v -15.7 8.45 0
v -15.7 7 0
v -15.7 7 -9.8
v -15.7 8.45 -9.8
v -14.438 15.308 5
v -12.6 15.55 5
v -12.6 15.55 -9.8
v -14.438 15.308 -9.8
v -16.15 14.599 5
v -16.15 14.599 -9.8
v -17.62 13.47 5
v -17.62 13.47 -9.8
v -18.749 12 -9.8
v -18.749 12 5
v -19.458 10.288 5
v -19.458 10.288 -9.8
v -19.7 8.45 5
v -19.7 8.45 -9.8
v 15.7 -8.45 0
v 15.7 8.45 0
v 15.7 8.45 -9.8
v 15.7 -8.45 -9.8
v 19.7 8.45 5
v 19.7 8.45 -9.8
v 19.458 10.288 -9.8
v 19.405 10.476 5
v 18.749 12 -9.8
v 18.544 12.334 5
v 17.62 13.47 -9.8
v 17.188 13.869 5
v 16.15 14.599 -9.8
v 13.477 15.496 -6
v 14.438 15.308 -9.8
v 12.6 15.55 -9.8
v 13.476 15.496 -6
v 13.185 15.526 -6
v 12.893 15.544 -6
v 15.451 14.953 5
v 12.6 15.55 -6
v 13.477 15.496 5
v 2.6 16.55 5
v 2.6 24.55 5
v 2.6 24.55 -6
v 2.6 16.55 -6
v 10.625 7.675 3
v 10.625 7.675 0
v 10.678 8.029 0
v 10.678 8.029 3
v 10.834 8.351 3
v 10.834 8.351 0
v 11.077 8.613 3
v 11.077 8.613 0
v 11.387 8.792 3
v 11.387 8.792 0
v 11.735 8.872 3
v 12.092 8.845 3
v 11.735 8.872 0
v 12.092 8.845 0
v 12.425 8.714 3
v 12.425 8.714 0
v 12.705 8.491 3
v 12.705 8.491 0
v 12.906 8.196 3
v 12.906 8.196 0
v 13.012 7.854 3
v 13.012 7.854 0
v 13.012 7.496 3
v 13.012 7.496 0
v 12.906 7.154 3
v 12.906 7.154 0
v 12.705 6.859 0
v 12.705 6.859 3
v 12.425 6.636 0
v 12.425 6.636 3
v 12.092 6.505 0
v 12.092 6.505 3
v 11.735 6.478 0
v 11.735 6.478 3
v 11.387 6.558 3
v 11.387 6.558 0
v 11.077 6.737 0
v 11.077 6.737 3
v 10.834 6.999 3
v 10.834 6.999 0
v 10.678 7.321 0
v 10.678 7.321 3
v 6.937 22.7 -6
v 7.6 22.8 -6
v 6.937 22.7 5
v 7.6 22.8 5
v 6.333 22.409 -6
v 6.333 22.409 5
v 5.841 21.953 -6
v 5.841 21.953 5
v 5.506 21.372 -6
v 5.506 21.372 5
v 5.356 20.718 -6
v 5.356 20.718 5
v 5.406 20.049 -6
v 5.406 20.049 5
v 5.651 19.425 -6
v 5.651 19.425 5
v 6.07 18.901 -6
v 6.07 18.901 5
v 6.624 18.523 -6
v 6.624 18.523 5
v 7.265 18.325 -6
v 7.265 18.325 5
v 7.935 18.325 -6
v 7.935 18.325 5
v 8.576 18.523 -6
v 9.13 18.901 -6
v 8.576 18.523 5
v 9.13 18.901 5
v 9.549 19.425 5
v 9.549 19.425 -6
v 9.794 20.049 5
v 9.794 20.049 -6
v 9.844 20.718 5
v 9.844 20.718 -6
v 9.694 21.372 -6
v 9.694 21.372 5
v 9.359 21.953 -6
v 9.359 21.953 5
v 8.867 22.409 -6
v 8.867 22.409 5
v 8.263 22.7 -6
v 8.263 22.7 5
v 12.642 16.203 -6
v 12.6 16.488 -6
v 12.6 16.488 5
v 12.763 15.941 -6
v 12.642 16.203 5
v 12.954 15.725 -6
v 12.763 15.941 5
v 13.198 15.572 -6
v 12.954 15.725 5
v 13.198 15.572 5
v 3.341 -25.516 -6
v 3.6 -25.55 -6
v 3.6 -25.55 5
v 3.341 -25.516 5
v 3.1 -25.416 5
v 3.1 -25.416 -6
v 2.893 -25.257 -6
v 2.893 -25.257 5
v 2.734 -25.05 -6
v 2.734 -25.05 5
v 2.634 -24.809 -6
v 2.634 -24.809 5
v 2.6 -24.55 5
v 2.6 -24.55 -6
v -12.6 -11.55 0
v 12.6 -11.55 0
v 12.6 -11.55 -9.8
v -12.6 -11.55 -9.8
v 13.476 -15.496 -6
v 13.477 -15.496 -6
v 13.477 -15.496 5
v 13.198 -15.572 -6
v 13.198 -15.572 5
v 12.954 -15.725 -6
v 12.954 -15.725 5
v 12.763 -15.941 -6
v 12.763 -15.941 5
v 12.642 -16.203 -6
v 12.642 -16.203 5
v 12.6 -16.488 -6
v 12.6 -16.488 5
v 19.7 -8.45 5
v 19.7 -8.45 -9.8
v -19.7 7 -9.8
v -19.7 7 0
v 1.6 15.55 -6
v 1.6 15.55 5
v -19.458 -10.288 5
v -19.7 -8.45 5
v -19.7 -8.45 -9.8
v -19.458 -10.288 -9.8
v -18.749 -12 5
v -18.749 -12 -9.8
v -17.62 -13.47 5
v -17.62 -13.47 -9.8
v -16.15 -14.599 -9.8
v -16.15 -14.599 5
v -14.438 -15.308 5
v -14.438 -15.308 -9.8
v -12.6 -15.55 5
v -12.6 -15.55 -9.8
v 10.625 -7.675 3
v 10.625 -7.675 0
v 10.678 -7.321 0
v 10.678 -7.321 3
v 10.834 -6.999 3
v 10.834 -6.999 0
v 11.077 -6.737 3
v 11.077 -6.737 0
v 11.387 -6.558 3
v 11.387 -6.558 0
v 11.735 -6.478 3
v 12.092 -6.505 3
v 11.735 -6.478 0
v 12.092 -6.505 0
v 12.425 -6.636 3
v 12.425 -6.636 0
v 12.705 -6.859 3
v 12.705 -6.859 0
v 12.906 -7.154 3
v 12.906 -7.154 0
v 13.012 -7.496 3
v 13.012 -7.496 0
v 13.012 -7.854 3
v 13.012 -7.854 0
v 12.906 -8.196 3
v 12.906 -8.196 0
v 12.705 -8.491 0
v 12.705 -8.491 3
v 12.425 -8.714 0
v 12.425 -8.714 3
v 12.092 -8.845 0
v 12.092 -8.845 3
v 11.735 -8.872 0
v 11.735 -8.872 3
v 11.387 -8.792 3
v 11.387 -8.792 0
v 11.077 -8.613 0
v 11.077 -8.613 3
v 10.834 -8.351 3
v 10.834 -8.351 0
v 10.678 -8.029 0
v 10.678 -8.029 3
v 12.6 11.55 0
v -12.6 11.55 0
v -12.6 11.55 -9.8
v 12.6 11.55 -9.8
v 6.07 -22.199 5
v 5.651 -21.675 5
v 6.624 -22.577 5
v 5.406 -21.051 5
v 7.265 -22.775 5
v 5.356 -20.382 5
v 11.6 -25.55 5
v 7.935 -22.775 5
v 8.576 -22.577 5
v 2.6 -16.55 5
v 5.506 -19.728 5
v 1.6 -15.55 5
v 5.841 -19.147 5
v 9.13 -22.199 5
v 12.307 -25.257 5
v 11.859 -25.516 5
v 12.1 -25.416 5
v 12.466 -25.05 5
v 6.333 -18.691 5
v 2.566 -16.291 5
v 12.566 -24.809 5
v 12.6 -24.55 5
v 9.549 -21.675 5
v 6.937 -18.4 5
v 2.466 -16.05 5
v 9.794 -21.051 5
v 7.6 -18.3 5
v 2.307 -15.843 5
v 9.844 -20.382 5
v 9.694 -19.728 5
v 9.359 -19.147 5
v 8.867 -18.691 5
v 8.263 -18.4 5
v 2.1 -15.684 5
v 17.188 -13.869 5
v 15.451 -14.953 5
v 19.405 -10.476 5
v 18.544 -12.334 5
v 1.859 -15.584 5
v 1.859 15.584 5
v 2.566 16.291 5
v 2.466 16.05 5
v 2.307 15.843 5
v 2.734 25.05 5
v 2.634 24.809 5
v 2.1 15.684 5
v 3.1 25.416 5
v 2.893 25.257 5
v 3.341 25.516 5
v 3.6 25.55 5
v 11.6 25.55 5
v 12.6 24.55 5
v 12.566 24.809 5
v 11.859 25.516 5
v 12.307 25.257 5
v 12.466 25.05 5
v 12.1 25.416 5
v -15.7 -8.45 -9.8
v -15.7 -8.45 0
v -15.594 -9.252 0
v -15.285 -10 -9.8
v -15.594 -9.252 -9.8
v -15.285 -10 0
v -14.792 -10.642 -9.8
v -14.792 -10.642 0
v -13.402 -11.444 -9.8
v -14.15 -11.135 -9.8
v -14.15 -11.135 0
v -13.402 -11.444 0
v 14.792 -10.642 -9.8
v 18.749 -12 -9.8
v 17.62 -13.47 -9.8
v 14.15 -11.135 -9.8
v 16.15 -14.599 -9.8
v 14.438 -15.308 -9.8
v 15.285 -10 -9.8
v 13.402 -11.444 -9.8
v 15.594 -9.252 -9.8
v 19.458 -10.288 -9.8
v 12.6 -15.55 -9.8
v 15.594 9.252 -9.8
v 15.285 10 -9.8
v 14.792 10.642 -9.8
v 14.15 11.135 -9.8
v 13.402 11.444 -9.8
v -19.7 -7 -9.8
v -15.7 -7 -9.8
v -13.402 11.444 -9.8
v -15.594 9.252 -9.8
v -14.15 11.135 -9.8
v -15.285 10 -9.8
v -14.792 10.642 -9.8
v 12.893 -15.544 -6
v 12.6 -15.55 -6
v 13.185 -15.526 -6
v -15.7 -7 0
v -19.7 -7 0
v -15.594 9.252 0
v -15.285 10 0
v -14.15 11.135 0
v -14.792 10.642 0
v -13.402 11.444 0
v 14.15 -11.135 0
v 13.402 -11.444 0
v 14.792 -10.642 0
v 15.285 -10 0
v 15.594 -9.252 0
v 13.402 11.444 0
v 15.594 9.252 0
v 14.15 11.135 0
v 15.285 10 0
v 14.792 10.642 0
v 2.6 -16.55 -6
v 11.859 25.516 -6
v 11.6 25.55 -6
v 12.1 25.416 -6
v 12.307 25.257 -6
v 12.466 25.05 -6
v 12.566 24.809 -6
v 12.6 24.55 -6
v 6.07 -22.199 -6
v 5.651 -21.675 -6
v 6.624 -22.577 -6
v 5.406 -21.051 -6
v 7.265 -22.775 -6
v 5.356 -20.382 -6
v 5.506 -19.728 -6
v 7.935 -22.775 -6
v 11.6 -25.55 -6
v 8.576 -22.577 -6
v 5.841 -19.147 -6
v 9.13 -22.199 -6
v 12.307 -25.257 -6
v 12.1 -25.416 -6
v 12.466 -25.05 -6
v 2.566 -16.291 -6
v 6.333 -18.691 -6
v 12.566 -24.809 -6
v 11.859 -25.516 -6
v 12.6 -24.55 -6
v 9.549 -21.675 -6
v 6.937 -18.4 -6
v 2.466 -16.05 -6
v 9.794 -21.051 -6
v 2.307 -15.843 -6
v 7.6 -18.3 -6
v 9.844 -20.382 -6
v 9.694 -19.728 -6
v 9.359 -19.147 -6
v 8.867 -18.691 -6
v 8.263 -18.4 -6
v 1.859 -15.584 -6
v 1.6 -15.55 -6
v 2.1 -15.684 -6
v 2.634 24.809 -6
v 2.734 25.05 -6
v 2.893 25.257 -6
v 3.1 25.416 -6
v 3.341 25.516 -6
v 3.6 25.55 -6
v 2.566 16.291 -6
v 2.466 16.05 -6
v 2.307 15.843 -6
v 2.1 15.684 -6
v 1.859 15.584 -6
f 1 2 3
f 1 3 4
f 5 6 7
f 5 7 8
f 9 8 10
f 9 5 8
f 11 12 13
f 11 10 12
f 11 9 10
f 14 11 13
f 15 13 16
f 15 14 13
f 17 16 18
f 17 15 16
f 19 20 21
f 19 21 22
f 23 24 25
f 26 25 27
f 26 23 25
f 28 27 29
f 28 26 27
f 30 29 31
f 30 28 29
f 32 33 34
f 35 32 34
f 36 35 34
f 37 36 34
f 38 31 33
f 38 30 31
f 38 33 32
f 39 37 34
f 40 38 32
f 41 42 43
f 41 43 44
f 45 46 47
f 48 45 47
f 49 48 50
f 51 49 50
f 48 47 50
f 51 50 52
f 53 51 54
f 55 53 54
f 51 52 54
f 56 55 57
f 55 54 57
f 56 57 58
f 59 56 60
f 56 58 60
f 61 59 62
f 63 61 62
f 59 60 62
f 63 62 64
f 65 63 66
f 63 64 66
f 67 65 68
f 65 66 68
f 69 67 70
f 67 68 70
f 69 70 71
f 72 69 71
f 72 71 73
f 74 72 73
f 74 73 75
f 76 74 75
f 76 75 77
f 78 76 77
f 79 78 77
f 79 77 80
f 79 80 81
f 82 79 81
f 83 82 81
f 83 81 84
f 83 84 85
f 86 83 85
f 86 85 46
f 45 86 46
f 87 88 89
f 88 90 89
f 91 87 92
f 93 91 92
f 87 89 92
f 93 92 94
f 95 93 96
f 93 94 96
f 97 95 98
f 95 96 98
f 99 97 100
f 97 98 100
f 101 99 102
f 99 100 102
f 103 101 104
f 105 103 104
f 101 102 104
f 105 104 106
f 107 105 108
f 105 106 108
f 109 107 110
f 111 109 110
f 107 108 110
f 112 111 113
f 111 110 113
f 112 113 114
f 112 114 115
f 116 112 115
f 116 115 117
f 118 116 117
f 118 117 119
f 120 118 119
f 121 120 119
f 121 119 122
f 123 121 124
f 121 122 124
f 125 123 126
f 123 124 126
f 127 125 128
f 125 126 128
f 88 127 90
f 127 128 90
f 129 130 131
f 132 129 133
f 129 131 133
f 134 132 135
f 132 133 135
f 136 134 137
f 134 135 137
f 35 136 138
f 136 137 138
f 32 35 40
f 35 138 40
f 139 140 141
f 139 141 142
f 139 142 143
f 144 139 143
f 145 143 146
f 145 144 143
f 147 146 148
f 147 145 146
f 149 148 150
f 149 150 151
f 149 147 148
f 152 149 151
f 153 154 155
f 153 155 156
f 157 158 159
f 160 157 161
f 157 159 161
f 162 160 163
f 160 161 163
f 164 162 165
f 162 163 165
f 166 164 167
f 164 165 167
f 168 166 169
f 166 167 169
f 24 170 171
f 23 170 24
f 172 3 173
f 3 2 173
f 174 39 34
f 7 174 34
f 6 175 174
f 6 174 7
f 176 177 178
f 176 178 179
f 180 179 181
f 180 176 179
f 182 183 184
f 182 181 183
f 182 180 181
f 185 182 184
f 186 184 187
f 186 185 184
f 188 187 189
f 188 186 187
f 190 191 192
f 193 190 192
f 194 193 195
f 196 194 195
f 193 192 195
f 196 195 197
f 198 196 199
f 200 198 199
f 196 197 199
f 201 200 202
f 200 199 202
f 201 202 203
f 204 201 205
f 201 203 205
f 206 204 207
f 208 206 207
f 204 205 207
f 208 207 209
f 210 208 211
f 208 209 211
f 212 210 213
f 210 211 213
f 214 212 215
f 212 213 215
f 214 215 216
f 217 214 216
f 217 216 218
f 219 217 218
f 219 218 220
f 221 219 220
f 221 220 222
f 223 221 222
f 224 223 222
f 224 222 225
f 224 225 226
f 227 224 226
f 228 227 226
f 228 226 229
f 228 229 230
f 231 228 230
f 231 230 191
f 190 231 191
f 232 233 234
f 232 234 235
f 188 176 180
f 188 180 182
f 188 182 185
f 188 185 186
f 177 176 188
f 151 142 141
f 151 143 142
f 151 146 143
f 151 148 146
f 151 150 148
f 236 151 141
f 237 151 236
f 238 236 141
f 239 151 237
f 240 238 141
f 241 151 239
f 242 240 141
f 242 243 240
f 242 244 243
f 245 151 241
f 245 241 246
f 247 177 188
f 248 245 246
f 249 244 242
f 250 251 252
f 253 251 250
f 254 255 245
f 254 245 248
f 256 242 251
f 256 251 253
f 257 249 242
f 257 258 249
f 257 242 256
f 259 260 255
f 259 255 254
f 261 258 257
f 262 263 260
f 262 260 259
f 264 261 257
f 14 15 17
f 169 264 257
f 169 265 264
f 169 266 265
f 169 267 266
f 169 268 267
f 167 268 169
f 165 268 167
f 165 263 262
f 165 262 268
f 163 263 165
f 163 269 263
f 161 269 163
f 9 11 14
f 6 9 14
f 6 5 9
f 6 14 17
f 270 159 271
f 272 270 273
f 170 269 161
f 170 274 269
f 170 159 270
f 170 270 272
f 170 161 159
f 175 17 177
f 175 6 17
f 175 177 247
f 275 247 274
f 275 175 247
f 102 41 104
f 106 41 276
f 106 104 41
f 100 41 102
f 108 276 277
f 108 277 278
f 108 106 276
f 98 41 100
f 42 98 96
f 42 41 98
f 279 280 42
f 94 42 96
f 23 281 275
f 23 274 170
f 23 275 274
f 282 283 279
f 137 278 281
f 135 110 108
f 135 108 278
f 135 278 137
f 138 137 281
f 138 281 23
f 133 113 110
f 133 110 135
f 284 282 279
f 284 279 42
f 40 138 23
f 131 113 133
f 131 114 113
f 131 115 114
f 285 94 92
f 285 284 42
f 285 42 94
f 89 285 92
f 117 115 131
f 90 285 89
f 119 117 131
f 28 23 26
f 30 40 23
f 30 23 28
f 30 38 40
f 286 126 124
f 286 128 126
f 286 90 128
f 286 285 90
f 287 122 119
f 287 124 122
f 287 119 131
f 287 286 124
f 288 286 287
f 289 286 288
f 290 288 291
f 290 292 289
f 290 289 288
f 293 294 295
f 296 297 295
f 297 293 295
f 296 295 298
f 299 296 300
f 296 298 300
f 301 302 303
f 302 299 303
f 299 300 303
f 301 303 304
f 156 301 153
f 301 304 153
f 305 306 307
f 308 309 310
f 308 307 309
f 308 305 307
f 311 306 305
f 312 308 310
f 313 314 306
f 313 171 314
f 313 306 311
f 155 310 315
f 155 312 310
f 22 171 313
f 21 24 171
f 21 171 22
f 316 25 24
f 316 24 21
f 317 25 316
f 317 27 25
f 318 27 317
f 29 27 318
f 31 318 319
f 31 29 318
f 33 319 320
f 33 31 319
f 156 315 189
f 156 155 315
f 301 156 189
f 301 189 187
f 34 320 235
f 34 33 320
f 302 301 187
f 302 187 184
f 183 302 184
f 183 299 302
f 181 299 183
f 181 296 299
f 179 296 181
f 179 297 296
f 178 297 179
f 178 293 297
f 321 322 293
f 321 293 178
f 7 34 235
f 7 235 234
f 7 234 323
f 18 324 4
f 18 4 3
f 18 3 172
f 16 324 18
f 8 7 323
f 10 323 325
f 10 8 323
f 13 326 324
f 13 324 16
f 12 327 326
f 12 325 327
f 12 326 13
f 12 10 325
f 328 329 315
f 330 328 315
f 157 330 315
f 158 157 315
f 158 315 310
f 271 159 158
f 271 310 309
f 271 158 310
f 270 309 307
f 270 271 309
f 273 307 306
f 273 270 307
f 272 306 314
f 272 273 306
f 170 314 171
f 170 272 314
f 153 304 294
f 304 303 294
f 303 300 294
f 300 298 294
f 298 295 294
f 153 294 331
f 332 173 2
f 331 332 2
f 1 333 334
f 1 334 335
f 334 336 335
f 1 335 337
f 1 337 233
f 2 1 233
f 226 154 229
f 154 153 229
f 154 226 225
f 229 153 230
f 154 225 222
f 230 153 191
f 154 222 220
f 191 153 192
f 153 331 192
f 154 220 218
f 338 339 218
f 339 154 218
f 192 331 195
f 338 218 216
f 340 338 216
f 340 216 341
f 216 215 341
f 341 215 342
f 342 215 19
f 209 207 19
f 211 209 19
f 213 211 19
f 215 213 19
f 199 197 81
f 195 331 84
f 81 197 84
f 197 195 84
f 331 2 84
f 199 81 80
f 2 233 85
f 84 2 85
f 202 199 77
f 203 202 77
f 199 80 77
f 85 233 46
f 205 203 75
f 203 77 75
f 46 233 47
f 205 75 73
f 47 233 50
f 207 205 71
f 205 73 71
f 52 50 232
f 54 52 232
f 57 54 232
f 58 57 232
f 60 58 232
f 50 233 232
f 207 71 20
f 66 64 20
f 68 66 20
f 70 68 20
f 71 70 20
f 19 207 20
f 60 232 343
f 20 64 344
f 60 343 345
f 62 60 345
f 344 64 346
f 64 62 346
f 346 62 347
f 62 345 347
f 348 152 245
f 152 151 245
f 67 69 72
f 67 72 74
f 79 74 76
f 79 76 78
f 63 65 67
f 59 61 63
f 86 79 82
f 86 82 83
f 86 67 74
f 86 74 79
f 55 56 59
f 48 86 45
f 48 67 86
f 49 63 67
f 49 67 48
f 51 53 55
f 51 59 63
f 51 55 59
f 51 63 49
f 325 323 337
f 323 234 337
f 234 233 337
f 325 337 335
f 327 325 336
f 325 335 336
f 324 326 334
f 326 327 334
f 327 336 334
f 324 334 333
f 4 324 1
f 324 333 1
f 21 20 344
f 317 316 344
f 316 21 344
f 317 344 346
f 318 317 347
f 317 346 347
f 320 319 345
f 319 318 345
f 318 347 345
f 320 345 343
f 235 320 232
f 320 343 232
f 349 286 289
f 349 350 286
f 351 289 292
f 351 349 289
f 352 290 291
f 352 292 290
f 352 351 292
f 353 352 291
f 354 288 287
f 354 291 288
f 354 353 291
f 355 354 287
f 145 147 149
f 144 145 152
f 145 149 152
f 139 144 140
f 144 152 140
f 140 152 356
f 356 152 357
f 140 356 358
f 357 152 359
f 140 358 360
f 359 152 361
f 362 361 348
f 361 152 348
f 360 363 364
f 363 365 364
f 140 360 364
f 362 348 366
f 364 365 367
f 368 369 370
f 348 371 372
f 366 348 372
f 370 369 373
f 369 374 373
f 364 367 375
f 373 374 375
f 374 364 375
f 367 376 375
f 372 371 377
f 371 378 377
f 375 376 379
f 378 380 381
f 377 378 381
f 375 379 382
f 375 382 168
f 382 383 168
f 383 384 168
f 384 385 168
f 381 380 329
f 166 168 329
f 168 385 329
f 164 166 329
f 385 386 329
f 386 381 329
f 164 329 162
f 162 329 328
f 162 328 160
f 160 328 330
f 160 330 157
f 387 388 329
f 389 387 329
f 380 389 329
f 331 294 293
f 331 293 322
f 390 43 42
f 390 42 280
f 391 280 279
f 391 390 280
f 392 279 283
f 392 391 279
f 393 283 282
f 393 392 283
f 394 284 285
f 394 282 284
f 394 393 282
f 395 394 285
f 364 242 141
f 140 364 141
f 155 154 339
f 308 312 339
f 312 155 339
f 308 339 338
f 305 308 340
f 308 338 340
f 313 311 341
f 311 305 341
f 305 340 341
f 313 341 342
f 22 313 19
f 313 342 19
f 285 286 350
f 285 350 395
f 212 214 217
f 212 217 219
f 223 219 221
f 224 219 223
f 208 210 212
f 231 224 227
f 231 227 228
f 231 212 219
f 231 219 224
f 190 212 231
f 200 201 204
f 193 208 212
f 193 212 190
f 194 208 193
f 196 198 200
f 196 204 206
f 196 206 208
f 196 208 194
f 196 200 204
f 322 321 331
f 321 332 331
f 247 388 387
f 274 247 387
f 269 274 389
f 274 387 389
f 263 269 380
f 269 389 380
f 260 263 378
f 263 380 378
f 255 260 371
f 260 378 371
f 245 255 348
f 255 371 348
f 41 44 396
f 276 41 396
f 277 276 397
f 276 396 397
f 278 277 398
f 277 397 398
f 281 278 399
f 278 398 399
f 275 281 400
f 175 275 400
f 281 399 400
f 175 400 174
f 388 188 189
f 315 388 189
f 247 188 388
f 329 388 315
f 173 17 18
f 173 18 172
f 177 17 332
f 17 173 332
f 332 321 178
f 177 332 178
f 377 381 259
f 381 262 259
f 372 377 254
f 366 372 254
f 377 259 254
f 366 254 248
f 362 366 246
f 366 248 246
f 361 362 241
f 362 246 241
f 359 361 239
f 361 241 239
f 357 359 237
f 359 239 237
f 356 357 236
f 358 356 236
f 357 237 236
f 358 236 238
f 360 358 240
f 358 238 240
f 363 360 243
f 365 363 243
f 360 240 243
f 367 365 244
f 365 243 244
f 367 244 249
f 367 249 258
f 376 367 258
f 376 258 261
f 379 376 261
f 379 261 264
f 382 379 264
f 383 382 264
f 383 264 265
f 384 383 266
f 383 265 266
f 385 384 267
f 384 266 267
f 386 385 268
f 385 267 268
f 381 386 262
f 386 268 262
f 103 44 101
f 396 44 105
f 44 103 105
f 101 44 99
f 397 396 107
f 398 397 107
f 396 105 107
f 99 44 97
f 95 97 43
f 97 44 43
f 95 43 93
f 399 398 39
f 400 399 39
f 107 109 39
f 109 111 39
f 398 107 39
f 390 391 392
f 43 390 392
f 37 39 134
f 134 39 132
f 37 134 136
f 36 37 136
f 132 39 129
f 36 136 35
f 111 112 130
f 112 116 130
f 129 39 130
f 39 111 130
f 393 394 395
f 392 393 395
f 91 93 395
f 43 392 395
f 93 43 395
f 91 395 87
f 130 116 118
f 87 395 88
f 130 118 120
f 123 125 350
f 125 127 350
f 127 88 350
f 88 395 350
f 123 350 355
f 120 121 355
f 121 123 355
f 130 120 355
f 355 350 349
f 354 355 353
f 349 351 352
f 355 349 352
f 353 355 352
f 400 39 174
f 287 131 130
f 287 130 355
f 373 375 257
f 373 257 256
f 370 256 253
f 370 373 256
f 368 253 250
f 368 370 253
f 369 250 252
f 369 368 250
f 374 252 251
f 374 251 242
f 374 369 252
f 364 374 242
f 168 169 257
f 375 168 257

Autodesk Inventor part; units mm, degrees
ref_plane "YZ Plane" through (0, 0, 0) normal (1, 0, 0) x (0, 1, 0)
ref_plane "XZ Plane" through (0, 0, 0) normal (0, 1, 0) x (-1, 0, 0)
ref_plane "XY Plane" through (0, 0, 0) normal (0, 0, 1) x (1, 0, 0)
sketch "Sketch1" plane through (0, 0, 0) normal (0, 0, 1) x (1, 0, 0)
  arc A0 (-12.6, 10.95) -> (-15.1, 8.45) centre (-12.6, 8.45) ccw projected
  line L0 (-15.1, 8.45) -> (-15.1, -8.45) projected
  arc A1 (-15.1, -8.45) -> (-12.6, -10.95) centre (-12.6, -8.45) ccw projected
  line L1 (-12.6, -10.95) -> (12.6, -10.95) projected
  arc A2 (12.6, -10.95) -> (15.1, -8.45) centre (12.6, -8.45) ccw projected
  line L2 (15.1, -8.45) -> (15.1, 8.45) projected
  arc A3 (15.1, 8.45) -> (12.6, 10.95) centre (12.6, 8.45) ccw projected
  line L3 (12.6, 10.95) -> (-12.6, 10.95) projected
  circle A4 centre (11.825, 7.675) radius 1.575 projected
  circle A5 centre (11.825, -7.675) radius 1.575 projected
  line L4 (15.7, 8.45) -> (15.7, -8.45)
  arc A6 (12.6, -11.55) -> (15.7, -8.45) centre (12.6, -8.45) ccw
  line L5 (12.6, -11.55) -> (-12.6, -11.55)
  arc A7 (-15.7, -8.45) -> (-12.6, -11.55) centre (-12.6, -8.45) ccw
  line L6 (-15.7, -8.45) -> (-15.7, 8.45)
  arc A8 (-12.6, 11.55) -> (-15.7, 8.45) centre (-12.6, 8.45) ccw
  line L7 (-12.6, 11.55) -> (12.6, 11.55)
  arc A9 (15.7, 8.45) -> (12.6, 11.55) centre (12.6, 8.45) ccw
  line L8 (19.7, -8.45) -> (19.7, 8.45)
  arc A10 (19.7, 8.45) -> (12.6, 15.55) centre (12.6, 8.45) ccw
  line L9 (12.6, 15.55) -> (-12.6, 15.55)
  arc A11 (-12.6, 15.55) -> (-19.7, 8.45) centre (-12.6, 8.45) ccw
  line L10 (-19.7, 8.45) -> (-19.7, -8.45)
  arc A12 (-19.7, -8.45) -> (-12.6, -15.55) centre (-12.6, -8.45) ccw
  line L11 (-12.6, -15.55) -> (12.6, -15.55)
  arc A13 (12.6, -15.55) -> (19.7, -8.45) centre (12.6, -8.45) ccw
  point P0 (0, 0)
  dimension "d0" = 0.6
  dimension "d1" = 4
extrude "Extrusion1" add sketch "Sketch1" along normal blind 5 contours L3 A3 L2 A2 L1 A1 L0 A0 | A4 | A5 | L4 A6 L5 A7 L6 A8 L7 A9 | A13 L11 A12 L10 A11 L9 A10 L8
sketch "Sketch2" plane through (0, 0, 0) normal (0, 0, -1) x (-1, 0, 0)
  line L0 (12.6, 11.55) -> (-12.6, 11.55) projected
  arc A0 (15.7, 8.45) -> (12.6, 11.55) centre (12.6, 8.45) ccw projected
  line L1 (15.7, -8.45) -> (15.7, 8.45) projected
  arc A1 (12.6, -11.55) -> (15.7, -8.45) centre (12.6, -8.45) ccw projected
  line L2 (12.6, -10.95) -> (-12.6, -10.95) projected
  arc A2 (-15.7, -8.45) -> (-12.6, -11.55) centre (-12.6, -8.45) ccw projected
  line L3 (-15.7, 8.45) -> (-15.7, -8.45) projected
  arc A3 (-12.6, 11.55) -> (-15.7, 8.45) centre (-12.6, 8.45) ccw projected
  arc A4 (-12.6, 15.55) -> (-19.7, 8.45) centre (-12.6, 8.45) ccw projected
  line L4 (-19.7, -8.45) -> (-19.7, 8.45) projected
  arc A5 (-19.7, -8.45) -> (-12.6, -15.55) centre (-12.6, -8.45) ccw projected
  line L5 (12.6, -15.55) -> (-12.6, -15.55) projected
  arc A6 (12.6, -15.55) -> (19.7, -8.45) centre (12.6, -8.45) ccw projected
  line L6 (19.7, 8.45) -> (19.7, -8.45) projected
  arc A7 (19.7, 8.45) -> (12.6, 15.55) centre (12.6, 8.45) ccw projected
  line L7 (-12.6, 15.55) -> (12.6, 15.55) projected
  line L8 (7.1, -5) -> (15.1, -5) projected
  line L9 (15.1, -5) -> (15.1, 5) projected
  line L10 (15.1, 5) -> (7.1, 5) projected
  line L11 (7.1, 5) -> (7.1, -5) projected
  line L12 (15.7, 7) -> (19.7, 7)
  line L13 (19.7, 7) -> (19.7, -7)
  line L14 (19.7, -7) -> (15.7, -7)
  line L15 (15.7, -7) -> (15.7, 7)
  line L16 (15.7, 7) -> (19.7, -7) construction
  line L17 (19.7, 7) -> (15.7, -7) construction
  line L18 (-12.6, -11.55) -> (12.6, -11.55) projected
  point P0 (0, 0)
  point P1 (17.7, 0)
  point P2 (19.7, 0)
  point P3 (17.7, 7)
  dimension "d4" = 2
extrude "Extrusion2" add sketch "Sketch2" along normal blind 9.8 contours L0 A3 L3 A2 L18 A1 L1 L14 L6 A6 L5 A5 L4 A4 L7 A7 L12 A0
sketch "Sketch3" plane through (0, 0, 0) normal (0, 0, -1) x (-1, 0, 0)
  circle A0 centre (-11.825, -7.675) radius 1.575 projected
  circle A1 centre (-11.825, 7.675) radius 1.575 projected
  circle A2 centre (-11.825, -7.675) radius 1.2
  circle A3 centre (-11.825, 7.675) radius 1.2
  point P0 (0, 0)
  dimension "d7" = 3.15
  dimension "d8" = 2.4
  dimension "d9" = 2.4
extrude "Extrusion3" cut sketch "Sketch3" against normal blind 3 contours A2 | A3
sketch "Sketch4" plane through (0, 0, 5) normal (0, 0, 1) x (1, 0, 0)
  arc A0 (19.7, 8.45) -> (12.6, 15.55) centre (12.6, 8.45) ccw projected
  line L0 (12.6, 15.55) -> (-12.6, 15.55) projected
  arc A1 (-12.6, 15.55) -> (-19.7, 8.45) centre (-12.6, 8.45) ccw projected
  line L1 (-19.7, 8.45) -> (-19.7, -8.45) projected
  arc A2 (-19.7, -8.45) -> (-12.6, -15.55) centre (-12.6, -8.45) ccw projected
  line L2 (-12.6, -15.55) -> (12.6, -15.55) projected
  arc A3 (12.6, -15.55) -> (19.7, -8.45) centre (12.6, -8.45) ccw projected
  line L3 (19.7, -8.45) -> (19.7, 8.45) projected
  line L4 (-2.6, -15.55) -> (-12.6, -15.55)
  line L5 (-12.6, -15.55) -> (-12.6, -25.55)
  line L6 (-12.6, -25.55) -> (-2.6, -25.55)
  line L7 (-2.6, -25.55) -> (-2.6, -15.55)
  line L8 (-2.6, -15.55) -> (-12.6, -25.55) construction
  line L9 (-12.6, -15.55) -> (-2.6, -25.55) construction
  line L10 (-12.6, -15.55) -> (12.6, -15.55) projected
  line L11 (19.7, 0) -> (-19.7, 0)
  line L12 (0, 15.55) -> (0, -15.55)
  line L13 (-2.6, 15.55) -> (-12.6, 15.55)
  line L14 (-12.6, 15.55) -> (-12.6, 25.55)
  line L15 (-12.6, 25.55) -> (-2.6, 25.55)
  line L16 (-2.6, 25.55) -> (-2.6, 15.55)
  line L17 (-2.6, 15.55) -> (-12.6, 25.55) construction
  line L18 (-12.6, 15.55) -> (-2.6, 25.55) construction
  arc A4 (19.7, 8.45) -> (12.6, 15.55) centre (12.6, 8.45) ccw
  line L19 (2.6, 15.55) -> (12.6, 15.55)
  line L20 (2.6, 25.55) -> (2.6, 15.55)
  line L21 (2.6, 15.55) -> (12.6, 25.55) construction
  line L22 (12.6, 25.55) -> (2.6, 25.55)
  line L23 (12.6, 15.55) -> (2.6, 25.55) construction
  line L24 (12.6, 15.55) -> (12.6, 25.55)
  line L25 (2.6, -15.55) -> (12.6, -15.55)
  line L26 (2.6, -25.55) -> (2.6, -15.55)
  line L27 (2.6, -15.55) -> (12.6, -25.55) construction
  line L28 (12.6, -15.55) -> (2.6, -25.55) construction
  line L29 (12.6, -15.55) -> (12.6, -25.55)
  line L30 (12.6, -25.55) -> (2.6, -25.55)
  point P0 (0, 0)
  point P1 (-7.6, -20.55)
  point P2 (-7.6, 20.55)
  point P3 (7.6, 20.55)
  point P4 (2.6, 15.55)
  point P5 (-2.6, 15.55)
  point P6 (7.6, -20.55)
  point P7 (2.6, -15.55)
  dimension "d12" = 10
  dimension "d13" = 10
extrude "Extrusion4" add sketch "Sketch4" against normal blind 11 contours L0 L20 L22 L24 | L29 L30 L26 L2
sketch "Sketch5" plane through (0, 0, -6) normal (0, 0, -1) x (-1, 0, 0)
  line L0 (-12.6, -15.55) -> (-2.6, -15.55) projected
  line L1 (5.6, -22.55) -> (12.6, -15.55)
  line L2 (4.1, -17.05) -> (11.1, -24.05)
  line L3 (12.6, -11.55) -> (-12.6, -11.55) projected
  arc A0 (-15.7, -8.45) -> (-12.6, -11.55) centre (-12.6, -8.45) ccw projected
  line L4 (-15.7, -8.45) -> (-15.7, 8.45) projected
  arc A1 (-12.6, 11.55) -> (-15.7, 8.45) centre (-12.6, 8.45) ccw projected
  line L5 (-12.6, 11.55) -> (12.6, 11.55) projected
  arc A2 (15.7, 8.45) -> (12.6, 11.55) centre (12.6, 8.45) ccw projected
  line L6 (15.7, 8.45) -> (15.7, 7) projected
  line L7 (15.7, 7) -> (19.7, 7) projected
  line L8 (19.7, 7) -> (19.7, 8.45) projected
  arc A3 (19.7, 8.45) -> (12.6, 15.55) centre (12.6, 8.45) ccw projected
  line L9 (12.6, 15.55) -> (-12.6, 15.55) projected
  arc A4 (-12.6, 15.55) -> (-19.7, 8.45) centre (-12.6, 8.45) ccw projected
  line L10 (-19.7, 8.45) -> (-19.7, -8.45) projected
  arc A5 (-19.7, -8.45) -> (-12.6, -15.55) centre (-12.6, -8.45) ccw projected
  line L11 (-12.6, -15.55) -> (12.6, -15.55) projected
  arc A6 (12.6, -15.55) -> (19.7, -8.45) centre (12.6, -8.45) ccw projected
  line L12 (19.7, -8.45) -> (19.7, -7) projected
  line L13 (19.7, -7) -> (15.7, -7) projected
  line L14 (15.7, -7) -> (15.7, -8.45) projected
  arc A7 (12.6, -11.55) -> (15.7, -8.45) centre (12.6, -8.45) ccw projected
  circle A8 centre (-11.825, 7.675) radius 1.2 projected
  circle A9 centre (-11.825, -7.675) radius 1.2 projected
  line L15 (19.7, 7) -> (15.7, 7) projected
  line L16 (15.7, 7) -> (15.7, 8.45) projected
  arc A10 (15.7, 8.45) -> (12.6, 11.55) centre (12.6, 8.45) ccw projected
  line L17 (12.6, 11.55) -> (-12.6, 11.55) projected
  arc A11 (-12.6, 11.55) -> (-15.7, 8.45) centre (-12.6, 8.45) ccw projected
  line L18 (-15.7, 8.45) -> (-15.7, -8.45) projected
  arc A12 (-15.7, -8.45) -> (-12.6, -11.55) centre (-12.6, -8.45) ccw projected
  line L19 (-12.6, -11.55) -> (12.6, -11.55) projected
  arc A13 (12.6, -11.55) -> (15.7, -8.45) centre (12.6, -8.45) ccw projected
  line L20 (15.7, -8.45) -> (15.7, -7) projected
  line L21 (15.7, -7) -> (19.7, -7) projected
  line L22 (19.7, 7) -> (19.7, -7) projected
  line L23 (19.7, 0) -> (-19.7, 0)
  line L24 (0, -15.55) -> (0, 15.55)
  line L25 (-12.6, -15.55) -> (-12.6, -25.55) projected
  line L26 (-12.6, -25.55) -> (-2.6, -25.55) projected
  line L27 (-2.6, -25.55) -> (-2.6, -15.55) projected
  point P0 (0, 0)
  point P1 (7.6, -20.55)
  point P2 (7.6, 20.55)
  point P3 (-7.6, 20.55)
  point P4 (-7.6, -20.55)
hole "Hole1" at (7.6, 20.55, -6) at (7.6, -20.55, -6) direction (0, 0, 1) diameter 4.5 end through all clearance for "Countersunk Flat Head Hex Socket Screw ISO 10642" size "M4" standard "ISO"
fillet "Fillet1" radius 1 2 edges at (12.6, -15.55, -0.5) (12.6, 15.55, -0.5)
fillet "Fillet2" radius 1 6 edges at (2.6, -15.55, -0.5) (2.6, 15.55, -0.5) (12.6, 25.55, -0.5) (2.6, 25.55, -0.5) (2.6, -25.55, -0.5) (12.6, -25.55, -0.5)
sketch "Sketch6" plane through (0, 0, -9.8) normal (0, 0, -1) x (-1, 0, 0)
  line L0 (12.6, -11.55) -> (-12.6, -11.55) projected
  arc A0 (-15.7, -8.45) -> (-12.6, -11.55) centre (-12.6, -8.45) ccw projected
  line L1 (-15.7, -8.45) -> (-15.7, 8.45) projected
  arc A1 (-12.6, 11.55) -> (-15.7, 8.45) centre (-12.6, 8.45) ccw projected
  line L2 (-12.6, 11.55) -> (12.6, 11.55) projected
  arc A2 (15.7, 8.45) -> (12.6, 11.55) centre (12.6, 8.45) ccw projected
  line L3 (15.7, 8.45) -> (15.7, 7) projected
  line L4 (15.7, 7) -> (19.7, 7) projected
  line L5 (19.7, 7) -> (19.7, 8.45) projected
  arc A3 (19.7, 8.45) -> (12.6, 15.55) centre (12.6, 8.45) ccw projected
  line L6 (12.6, 15.55) -> (-13.2535, 15.55) projected
  arc A4 (-13.4765, 15.4957) -> (-13.2535, 15.55) centre (-13.6, 16.488) ccw projected
  arc A5 (-13.4765, 15.4957) -> (-19.7, 8.45) centre (-12.6, 8.45) ccw projected
  line L7 (-19.7, 8.45) -> (-19.7, -8.45) projected
  arc A6 (-19.7, -8.45) -> (-13.4765, -15.4957) centre (-12.6, -8.45) ccw projected
  arc A7 (-13.2535, -15.55) -> (-13.4765, -15.4957) centre (-13.6, -16.488) ccw projected
  line L8 (-13.2535, -15.55) -> (12.6, -15.55) projected
  arc A8 (12.6, -15.55) -> (19.7, -8.45) centre (12.6, -8.45) ccw projected
  line L9 (19.7, -8.45) -> (19.7, -7) projected
  line L10 (19.7, -7) -> (15.7, -7) projected
  line L11 (15.7, -7) -> (15.7, -8.45) projected
  arc A9 (12.6, -11.55) -> (15.7, -8.45) centre (12.6, -8.45) ccw projected
  arc A10 (-12.6, 15.55) -> (-19.7, 8.45) centre (-12.6, 8.45) ccw projected
  arc A11 (-19.7, -8.45) -> (-12.6, -15.55) centre (-12.6, -8.45) ccw projected
  point P0 (0, 0)
extrude "Extrusion5" cut sketch "Sketch6" against normal up to surface (3.8 mm away) contours L8 A7 A11 | A4 L6 A10
equation "\"d9\" = d8"
properties part number "PrzyciskSTOP_1_3DPrint"
